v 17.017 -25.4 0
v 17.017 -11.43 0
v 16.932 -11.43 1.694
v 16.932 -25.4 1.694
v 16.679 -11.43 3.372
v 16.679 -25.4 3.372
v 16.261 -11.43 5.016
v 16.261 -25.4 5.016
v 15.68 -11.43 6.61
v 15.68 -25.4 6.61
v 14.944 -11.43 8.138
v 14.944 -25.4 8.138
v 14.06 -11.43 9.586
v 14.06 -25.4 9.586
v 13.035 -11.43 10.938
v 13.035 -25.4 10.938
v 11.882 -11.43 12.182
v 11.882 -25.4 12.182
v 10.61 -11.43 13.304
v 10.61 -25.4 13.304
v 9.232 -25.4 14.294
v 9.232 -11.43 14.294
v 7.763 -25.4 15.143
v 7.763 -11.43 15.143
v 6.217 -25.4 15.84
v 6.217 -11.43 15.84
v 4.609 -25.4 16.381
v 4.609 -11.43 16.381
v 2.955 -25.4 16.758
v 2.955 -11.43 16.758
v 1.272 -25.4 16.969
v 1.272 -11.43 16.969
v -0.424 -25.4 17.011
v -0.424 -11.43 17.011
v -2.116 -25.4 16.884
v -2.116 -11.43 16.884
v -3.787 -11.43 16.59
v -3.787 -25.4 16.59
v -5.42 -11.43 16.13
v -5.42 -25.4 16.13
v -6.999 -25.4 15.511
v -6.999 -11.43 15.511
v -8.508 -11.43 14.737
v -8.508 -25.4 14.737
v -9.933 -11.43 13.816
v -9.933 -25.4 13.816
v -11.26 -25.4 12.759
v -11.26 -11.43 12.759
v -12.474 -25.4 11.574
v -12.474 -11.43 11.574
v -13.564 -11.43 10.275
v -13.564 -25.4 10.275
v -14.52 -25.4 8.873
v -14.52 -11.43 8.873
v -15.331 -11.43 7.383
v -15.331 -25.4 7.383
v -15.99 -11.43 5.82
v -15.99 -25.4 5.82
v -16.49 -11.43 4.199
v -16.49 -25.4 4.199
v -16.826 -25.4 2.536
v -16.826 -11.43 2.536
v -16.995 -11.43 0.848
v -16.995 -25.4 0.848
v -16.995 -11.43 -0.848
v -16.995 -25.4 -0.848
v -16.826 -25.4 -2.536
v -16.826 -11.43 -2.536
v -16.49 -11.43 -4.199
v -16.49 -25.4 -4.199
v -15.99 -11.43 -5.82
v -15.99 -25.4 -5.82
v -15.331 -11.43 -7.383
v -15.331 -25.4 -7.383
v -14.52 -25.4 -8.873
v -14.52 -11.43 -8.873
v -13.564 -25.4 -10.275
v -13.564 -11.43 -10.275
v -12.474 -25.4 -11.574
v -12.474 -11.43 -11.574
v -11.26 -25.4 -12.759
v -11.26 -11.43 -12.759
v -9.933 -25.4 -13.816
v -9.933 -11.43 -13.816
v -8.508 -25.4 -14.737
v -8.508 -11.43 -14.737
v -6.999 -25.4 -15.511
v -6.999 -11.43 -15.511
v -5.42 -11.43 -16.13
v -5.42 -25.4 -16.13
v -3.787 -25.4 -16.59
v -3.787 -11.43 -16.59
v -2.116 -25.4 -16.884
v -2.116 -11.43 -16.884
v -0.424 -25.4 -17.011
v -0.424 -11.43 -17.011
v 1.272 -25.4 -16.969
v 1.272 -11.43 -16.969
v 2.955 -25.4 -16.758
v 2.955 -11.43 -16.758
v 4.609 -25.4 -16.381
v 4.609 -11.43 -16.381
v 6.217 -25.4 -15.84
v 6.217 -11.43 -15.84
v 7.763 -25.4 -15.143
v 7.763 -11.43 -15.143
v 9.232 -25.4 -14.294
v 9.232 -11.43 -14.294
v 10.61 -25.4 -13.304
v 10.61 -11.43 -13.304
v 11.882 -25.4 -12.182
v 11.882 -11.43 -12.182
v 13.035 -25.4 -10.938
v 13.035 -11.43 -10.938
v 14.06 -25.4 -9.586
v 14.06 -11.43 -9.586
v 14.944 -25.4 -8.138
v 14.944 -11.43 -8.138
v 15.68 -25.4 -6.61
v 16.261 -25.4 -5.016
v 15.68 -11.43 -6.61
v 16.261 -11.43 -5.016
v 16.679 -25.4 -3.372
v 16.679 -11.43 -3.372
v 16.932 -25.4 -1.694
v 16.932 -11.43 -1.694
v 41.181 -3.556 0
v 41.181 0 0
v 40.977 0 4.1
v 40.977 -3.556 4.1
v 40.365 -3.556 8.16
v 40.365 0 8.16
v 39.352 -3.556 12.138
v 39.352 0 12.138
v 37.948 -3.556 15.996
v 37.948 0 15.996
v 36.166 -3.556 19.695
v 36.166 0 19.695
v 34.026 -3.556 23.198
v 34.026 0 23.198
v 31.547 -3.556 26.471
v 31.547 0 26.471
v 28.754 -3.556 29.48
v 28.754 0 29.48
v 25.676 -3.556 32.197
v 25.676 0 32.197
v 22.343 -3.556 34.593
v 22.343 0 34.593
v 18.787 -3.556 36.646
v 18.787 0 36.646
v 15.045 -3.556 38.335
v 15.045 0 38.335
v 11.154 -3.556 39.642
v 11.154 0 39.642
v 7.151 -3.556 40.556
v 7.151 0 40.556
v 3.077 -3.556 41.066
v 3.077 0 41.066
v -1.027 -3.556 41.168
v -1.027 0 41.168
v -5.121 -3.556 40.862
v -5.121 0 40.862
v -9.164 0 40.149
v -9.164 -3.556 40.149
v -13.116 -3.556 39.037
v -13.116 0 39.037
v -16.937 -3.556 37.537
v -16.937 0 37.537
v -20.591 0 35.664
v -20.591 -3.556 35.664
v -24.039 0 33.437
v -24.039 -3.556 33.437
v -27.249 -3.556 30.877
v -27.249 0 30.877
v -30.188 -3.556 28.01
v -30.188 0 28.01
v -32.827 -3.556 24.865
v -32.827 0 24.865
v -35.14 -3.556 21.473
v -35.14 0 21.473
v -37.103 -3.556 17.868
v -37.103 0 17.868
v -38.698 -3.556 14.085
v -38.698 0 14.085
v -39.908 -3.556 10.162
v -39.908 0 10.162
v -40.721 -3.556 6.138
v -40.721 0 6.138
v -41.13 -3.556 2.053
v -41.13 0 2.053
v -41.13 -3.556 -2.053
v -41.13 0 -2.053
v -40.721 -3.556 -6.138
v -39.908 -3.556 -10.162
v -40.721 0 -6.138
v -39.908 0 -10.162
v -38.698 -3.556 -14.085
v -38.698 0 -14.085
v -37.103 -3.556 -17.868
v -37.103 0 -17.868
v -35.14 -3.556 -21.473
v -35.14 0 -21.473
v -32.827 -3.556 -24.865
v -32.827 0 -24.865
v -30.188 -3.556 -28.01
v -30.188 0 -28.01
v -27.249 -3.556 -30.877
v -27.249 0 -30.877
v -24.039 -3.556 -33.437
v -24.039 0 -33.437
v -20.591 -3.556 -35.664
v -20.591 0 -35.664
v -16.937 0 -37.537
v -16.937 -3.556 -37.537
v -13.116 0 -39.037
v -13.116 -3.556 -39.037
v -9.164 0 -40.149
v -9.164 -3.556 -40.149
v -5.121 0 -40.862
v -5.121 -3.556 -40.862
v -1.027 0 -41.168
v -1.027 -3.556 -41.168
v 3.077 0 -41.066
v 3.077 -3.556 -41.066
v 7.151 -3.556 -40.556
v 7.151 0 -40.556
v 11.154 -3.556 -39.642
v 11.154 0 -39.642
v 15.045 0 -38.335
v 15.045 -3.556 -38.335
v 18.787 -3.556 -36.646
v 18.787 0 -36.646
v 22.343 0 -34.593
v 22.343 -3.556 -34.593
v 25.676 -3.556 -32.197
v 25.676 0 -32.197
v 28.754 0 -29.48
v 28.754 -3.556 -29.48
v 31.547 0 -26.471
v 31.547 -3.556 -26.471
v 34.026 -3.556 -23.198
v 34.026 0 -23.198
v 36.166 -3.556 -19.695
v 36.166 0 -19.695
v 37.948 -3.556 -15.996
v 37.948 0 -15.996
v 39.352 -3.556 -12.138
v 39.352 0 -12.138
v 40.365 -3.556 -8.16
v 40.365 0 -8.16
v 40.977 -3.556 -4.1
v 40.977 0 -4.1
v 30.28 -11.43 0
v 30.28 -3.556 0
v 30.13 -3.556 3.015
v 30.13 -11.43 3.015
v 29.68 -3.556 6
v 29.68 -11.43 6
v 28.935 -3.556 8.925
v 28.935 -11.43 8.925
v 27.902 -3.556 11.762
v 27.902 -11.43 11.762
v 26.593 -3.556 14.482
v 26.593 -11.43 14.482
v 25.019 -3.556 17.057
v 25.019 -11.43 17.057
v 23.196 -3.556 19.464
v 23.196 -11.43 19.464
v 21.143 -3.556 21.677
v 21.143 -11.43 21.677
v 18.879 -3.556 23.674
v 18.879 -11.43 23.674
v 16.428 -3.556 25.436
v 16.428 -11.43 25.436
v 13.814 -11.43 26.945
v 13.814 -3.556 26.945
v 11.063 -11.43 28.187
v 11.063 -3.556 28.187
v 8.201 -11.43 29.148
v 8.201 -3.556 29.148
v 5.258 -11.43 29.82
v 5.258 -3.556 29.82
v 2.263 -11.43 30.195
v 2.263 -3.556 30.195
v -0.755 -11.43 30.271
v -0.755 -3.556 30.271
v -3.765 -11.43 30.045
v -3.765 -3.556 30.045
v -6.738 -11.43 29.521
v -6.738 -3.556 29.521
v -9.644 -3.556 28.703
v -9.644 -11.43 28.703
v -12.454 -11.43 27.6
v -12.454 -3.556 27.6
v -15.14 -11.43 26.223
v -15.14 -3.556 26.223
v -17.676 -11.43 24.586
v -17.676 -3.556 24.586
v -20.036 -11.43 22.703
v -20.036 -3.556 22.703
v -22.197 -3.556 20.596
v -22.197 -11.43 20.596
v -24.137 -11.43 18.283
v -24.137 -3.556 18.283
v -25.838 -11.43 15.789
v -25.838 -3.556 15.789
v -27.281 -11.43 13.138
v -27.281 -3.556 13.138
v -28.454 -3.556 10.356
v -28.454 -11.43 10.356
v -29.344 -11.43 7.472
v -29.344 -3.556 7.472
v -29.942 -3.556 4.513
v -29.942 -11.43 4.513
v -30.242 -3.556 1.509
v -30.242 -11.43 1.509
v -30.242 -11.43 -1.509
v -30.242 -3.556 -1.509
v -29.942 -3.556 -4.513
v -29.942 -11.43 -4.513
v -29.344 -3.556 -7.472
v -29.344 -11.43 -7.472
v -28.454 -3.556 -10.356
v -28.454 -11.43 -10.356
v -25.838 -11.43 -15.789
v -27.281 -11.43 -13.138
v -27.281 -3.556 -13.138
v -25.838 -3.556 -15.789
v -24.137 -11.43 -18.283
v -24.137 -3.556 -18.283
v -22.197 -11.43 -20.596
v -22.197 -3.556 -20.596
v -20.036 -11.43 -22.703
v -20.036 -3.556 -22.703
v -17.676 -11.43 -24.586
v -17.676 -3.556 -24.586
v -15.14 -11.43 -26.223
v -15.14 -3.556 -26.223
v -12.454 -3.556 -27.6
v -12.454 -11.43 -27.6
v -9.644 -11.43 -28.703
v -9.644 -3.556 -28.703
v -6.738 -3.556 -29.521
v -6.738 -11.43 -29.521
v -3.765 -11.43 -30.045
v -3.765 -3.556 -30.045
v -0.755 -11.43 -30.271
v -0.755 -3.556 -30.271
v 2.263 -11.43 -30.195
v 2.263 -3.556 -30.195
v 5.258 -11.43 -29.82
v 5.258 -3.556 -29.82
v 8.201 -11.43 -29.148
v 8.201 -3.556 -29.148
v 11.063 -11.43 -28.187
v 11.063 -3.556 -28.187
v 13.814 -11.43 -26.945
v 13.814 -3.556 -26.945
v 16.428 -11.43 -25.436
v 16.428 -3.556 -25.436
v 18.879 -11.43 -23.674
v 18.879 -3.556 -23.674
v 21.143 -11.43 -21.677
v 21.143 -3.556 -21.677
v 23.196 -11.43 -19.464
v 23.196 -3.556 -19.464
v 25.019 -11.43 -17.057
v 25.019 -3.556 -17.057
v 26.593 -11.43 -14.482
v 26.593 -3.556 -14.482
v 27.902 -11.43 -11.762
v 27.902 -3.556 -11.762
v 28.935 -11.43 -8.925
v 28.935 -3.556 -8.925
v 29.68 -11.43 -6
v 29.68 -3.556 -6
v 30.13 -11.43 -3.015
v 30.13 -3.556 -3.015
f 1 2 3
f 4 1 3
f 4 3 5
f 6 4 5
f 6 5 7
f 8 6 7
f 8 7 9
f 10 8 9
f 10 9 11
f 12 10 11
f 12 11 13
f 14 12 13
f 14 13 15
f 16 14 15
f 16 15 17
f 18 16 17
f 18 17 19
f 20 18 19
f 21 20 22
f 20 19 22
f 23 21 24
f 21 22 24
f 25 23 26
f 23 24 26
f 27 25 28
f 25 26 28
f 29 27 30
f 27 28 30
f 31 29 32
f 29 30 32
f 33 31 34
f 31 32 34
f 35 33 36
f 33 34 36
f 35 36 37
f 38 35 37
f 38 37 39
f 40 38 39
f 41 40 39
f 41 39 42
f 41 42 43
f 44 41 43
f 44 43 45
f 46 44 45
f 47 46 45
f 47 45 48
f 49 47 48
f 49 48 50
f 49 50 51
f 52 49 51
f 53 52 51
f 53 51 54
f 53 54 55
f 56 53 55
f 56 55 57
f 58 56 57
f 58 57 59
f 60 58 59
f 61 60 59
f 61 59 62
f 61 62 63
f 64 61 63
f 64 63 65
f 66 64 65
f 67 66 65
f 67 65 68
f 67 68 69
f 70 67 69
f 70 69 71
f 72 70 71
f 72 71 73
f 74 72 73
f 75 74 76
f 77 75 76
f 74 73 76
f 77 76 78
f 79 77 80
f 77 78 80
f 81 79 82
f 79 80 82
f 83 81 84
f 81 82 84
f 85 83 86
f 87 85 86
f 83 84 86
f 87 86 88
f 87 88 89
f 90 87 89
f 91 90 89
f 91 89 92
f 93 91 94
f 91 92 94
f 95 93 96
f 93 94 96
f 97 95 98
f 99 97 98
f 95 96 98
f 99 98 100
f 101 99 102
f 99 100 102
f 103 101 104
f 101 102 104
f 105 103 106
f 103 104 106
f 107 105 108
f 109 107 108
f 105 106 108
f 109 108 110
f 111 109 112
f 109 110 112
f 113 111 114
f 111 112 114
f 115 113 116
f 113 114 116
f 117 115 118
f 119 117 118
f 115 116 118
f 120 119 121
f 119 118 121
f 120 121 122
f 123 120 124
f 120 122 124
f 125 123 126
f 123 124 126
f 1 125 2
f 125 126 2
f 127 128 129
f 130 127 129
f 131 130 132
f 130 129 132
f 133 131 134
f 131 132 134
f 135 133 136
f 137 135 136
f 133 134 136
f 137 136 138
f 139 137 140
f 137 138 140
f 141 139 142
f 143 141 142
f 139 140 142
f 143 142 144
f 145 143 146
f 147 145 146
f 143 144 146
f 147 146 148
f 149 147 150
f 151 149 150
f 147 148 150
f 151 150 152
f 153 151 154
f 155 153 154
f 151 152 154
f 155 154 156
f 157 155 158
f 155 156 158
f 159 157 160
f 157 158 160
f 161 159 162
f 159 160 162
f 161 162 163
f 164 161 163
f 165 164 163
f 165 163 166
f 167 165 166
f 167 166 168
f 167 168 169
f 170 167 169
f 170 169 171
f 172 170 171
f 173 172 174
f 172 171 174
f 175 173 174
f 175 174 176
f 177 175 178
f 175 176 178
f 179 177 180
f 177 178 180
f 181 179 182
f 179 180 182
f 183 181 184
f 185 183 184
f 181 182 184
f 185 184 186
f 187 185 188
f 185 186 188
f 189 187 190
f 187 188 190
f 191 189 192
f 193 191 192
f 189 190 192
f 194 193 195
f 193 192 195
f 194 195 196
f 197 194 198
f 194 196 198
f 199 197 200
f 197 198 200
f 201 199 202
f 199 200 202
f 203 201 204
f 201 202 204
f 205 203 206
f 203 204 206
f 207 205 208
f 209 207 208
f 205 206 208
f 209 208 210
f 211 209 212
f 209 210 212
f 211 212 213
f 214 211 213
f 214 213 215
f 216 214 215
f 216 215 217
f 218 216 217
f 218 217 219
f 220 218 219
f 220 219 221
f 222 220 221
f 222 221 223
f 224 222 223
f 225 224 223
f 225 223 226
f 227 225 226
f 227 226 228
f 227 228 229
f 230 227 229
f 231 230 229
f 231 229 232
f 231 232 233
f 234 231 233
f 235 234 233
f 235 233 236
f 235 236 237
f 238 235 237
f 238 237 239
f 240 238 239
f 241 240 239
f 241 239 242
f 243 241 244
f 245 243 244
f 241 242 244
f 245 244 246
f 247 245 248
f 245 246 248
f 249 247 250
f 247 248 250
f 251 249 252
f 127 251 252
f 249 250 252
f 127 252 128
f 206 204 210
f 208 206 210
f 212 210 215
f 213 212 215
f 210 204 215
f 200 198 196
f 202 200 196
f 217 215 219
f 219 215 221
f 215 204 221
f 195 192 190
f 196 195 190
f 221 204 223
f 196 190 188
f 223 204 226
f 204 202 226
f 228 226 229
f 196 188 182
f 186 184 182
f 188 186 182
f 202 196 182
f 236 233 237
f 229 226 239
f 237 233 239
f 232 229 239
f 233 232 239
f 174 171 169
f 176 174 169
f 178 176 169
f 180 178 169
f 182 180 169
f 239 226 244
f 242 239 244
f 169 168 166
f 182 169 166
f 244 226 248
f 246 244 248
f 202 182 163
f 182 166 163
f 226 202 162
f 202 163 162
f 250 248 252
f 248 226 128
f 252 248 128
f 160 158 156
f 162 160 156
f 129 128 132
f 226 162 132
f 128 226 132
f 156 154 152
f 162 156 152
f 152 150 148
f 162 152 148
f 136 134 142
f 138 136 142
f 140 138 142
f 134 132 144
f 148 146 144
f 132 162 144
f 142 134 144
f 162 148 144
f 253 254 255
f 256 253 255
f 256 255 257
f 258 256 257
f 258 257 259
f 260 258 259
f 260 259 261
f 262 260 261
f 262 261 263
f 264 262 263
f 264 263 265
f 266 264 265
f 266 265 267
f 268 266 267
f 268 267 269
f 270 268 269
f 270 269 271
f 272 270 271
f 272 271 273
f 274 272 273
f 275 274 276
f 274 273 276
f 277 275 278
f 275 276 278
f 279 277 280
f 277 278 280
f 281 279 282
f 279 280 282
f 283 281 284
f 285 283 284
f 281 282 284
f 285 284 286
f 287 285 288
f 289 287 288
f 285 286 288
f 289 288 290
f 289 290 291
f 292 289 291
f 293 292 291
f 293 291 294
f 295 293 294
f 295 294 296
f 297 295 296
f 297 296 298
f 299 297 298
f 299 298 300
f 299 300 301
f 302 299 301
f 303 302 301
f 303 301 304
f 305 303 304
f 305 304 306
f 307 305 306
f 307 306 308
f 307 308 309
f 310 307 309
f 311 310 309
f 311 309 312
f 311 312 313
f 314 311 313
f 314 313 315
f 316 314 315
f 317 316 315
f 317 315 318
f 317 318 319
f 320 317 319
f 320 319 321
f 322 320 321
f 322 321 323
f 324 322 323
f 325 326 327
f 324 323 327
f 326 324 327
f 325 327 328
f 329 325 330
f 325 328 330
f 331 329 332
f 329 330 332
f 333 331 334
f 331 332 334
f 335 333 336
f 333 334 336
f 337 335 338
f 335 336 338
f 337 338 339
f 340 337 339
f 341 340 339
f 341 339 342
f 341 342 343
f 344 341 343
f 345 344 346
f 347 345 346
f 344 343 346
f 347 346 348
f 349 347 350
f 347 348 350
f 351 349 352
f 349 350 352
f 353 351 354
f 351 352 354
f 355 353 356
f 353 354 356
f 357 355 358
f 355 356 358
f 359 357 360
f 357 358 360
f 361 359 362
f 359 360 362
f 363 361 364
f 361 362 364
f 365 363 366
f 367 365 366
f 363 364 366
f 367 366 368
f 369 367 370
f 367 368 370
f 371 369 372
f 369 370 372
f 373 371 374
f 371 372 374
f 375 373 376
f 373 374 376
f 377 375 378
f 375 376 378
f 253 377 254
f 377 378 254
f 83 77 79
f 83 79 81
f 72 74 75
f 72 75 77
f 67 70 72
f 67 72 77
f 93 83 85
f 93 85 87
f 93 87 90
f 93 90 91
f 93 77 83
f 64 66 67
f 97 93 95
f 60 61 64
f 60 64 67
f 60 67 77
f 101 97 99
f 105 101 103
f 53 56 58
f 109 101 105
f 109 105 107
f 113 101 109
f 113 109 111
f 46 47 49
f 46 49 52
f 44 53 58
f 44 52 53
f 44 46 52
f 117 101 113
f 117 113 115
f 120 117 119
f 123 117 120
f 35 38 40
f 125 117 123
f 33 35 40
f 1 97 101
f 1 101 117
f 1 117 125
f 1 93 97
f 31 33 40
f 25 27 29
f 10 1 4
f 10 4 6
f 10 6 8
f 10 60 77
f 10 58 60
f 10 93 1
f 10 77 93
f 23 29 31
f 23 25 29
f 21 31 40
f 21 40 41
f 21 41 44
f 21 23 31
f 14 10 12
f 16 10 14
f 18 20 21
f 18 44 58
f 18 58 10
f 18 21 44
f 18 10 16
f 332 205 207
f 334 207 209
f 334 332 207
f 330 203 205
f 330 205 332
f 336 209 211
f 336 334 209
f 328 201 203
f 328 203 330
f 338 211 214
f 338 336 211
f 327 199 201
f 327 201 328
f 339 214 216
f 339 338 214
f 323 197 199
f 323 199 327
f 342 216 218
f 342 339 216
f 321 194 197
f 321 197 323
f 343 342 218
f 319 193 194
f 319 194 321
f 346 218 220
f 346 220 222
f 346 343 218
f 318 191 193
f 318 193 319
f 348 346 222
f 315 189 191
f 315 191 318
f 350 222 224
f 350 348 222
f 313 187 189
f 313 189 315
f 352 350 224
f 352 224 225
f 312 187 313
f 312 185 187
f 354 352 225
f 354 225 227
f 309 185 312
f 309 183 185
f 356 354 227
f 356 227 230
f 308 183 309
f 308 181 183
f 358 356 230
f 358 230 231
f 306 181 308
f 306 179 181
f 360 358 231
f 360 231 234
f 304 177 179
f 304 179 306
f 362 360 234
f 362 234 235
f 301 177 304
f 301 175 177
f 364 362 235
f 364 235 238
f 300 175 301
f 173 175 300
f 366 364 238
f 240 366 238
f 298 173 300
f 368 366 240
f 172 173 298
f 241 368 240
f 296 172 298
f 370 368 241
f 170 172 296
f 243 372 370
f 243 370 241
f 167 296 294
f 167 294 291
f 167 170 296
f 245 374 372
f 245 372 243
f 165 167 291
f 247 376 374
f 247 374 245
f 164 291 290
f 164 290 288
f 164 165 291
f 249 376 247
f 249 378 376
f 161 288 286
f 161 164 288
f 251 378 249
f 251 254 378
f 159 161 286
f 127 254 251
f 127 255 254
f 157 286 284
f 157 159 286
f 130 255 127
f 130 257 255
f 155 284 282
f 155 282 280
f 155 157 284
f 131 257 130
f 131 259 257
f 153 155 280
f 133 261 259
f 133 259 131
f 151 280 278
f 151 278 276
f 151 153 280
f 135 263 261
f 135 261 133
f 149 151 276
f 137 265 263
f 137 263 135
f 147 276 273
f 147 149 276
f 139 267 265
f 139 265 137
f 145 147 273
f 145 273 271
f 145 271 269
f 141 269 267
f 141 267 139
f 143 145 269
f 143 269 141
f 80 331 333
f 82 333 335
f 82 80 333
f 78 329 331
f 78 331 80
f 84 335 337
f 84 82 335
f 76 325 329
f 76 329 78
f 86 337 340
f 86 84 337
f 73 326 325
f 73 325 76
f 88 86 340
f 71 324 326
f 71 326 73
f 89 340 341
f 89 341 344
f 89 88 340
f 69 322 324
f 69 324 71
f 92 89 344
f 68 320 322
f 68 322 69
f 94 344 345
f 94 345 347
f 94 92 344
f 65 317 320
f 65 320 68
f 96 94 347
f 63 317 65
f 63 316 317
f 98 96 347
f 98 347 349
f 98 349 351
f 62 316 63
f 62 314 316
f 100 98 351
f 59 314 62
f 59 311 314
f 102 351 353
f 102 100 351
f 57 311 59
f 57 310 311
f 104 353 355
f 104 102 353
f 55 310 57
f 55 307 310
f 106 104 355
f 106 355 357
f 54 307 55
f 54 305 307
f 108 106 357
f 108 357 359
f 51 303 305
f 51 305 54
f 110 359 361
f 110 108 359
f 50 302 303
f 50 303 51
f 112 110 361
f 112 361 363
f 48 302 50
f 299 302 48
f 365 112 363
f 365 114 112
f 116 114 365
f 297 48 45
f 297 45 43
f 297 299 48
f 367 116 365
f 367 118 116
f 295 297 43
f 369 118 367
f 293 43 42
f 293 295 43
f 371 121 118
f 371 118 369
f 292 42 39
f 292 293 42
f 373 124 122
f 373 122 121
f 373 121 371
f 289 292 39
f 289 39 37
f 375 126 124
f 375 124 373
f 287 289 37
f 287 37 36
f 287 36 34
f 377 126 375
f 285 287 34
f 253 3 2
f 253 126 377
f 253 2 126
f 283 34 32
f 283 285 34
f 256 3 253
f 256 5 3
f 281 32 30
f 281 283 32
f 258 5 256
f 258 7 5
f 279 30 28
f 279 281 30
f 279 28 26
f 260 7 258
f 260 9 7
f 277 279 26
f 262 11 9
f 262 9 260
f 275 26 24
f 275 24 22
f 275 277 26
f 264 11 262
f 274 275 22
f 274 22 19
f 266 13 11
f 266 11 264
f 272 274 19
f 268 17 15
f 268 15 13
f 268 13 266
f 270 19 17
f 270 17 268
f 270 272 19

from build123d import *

# Parameters (mm, degrees)
F2_R     = 17.016537
F3_DEPTH = 25.4
F1_R     = 30.280081
F4_DEPTH = 11.43
F0_R     = 41.181284
F5_DEPTH = 3.556


with BuildPart() as f3:
    # F2 (on Front) → F3 (new body)
    with BuildSketch(Plane.XZ):
        Circle(F2_R)
    extrude(amount=F3_DEPTH)

    # F1 (on Front) → F4 (join)
    with BuildSketch(Plane.XZ):
        Circle(F1_R)
    extrude(amount=F4_DEPTH)

    # F0 (on Front) → F5 (join)
    with BuildSketch(Plane.XZ):
        Circle(F0_R)
    extrude(amount=F5_DEPTH)


solid = f3.part
